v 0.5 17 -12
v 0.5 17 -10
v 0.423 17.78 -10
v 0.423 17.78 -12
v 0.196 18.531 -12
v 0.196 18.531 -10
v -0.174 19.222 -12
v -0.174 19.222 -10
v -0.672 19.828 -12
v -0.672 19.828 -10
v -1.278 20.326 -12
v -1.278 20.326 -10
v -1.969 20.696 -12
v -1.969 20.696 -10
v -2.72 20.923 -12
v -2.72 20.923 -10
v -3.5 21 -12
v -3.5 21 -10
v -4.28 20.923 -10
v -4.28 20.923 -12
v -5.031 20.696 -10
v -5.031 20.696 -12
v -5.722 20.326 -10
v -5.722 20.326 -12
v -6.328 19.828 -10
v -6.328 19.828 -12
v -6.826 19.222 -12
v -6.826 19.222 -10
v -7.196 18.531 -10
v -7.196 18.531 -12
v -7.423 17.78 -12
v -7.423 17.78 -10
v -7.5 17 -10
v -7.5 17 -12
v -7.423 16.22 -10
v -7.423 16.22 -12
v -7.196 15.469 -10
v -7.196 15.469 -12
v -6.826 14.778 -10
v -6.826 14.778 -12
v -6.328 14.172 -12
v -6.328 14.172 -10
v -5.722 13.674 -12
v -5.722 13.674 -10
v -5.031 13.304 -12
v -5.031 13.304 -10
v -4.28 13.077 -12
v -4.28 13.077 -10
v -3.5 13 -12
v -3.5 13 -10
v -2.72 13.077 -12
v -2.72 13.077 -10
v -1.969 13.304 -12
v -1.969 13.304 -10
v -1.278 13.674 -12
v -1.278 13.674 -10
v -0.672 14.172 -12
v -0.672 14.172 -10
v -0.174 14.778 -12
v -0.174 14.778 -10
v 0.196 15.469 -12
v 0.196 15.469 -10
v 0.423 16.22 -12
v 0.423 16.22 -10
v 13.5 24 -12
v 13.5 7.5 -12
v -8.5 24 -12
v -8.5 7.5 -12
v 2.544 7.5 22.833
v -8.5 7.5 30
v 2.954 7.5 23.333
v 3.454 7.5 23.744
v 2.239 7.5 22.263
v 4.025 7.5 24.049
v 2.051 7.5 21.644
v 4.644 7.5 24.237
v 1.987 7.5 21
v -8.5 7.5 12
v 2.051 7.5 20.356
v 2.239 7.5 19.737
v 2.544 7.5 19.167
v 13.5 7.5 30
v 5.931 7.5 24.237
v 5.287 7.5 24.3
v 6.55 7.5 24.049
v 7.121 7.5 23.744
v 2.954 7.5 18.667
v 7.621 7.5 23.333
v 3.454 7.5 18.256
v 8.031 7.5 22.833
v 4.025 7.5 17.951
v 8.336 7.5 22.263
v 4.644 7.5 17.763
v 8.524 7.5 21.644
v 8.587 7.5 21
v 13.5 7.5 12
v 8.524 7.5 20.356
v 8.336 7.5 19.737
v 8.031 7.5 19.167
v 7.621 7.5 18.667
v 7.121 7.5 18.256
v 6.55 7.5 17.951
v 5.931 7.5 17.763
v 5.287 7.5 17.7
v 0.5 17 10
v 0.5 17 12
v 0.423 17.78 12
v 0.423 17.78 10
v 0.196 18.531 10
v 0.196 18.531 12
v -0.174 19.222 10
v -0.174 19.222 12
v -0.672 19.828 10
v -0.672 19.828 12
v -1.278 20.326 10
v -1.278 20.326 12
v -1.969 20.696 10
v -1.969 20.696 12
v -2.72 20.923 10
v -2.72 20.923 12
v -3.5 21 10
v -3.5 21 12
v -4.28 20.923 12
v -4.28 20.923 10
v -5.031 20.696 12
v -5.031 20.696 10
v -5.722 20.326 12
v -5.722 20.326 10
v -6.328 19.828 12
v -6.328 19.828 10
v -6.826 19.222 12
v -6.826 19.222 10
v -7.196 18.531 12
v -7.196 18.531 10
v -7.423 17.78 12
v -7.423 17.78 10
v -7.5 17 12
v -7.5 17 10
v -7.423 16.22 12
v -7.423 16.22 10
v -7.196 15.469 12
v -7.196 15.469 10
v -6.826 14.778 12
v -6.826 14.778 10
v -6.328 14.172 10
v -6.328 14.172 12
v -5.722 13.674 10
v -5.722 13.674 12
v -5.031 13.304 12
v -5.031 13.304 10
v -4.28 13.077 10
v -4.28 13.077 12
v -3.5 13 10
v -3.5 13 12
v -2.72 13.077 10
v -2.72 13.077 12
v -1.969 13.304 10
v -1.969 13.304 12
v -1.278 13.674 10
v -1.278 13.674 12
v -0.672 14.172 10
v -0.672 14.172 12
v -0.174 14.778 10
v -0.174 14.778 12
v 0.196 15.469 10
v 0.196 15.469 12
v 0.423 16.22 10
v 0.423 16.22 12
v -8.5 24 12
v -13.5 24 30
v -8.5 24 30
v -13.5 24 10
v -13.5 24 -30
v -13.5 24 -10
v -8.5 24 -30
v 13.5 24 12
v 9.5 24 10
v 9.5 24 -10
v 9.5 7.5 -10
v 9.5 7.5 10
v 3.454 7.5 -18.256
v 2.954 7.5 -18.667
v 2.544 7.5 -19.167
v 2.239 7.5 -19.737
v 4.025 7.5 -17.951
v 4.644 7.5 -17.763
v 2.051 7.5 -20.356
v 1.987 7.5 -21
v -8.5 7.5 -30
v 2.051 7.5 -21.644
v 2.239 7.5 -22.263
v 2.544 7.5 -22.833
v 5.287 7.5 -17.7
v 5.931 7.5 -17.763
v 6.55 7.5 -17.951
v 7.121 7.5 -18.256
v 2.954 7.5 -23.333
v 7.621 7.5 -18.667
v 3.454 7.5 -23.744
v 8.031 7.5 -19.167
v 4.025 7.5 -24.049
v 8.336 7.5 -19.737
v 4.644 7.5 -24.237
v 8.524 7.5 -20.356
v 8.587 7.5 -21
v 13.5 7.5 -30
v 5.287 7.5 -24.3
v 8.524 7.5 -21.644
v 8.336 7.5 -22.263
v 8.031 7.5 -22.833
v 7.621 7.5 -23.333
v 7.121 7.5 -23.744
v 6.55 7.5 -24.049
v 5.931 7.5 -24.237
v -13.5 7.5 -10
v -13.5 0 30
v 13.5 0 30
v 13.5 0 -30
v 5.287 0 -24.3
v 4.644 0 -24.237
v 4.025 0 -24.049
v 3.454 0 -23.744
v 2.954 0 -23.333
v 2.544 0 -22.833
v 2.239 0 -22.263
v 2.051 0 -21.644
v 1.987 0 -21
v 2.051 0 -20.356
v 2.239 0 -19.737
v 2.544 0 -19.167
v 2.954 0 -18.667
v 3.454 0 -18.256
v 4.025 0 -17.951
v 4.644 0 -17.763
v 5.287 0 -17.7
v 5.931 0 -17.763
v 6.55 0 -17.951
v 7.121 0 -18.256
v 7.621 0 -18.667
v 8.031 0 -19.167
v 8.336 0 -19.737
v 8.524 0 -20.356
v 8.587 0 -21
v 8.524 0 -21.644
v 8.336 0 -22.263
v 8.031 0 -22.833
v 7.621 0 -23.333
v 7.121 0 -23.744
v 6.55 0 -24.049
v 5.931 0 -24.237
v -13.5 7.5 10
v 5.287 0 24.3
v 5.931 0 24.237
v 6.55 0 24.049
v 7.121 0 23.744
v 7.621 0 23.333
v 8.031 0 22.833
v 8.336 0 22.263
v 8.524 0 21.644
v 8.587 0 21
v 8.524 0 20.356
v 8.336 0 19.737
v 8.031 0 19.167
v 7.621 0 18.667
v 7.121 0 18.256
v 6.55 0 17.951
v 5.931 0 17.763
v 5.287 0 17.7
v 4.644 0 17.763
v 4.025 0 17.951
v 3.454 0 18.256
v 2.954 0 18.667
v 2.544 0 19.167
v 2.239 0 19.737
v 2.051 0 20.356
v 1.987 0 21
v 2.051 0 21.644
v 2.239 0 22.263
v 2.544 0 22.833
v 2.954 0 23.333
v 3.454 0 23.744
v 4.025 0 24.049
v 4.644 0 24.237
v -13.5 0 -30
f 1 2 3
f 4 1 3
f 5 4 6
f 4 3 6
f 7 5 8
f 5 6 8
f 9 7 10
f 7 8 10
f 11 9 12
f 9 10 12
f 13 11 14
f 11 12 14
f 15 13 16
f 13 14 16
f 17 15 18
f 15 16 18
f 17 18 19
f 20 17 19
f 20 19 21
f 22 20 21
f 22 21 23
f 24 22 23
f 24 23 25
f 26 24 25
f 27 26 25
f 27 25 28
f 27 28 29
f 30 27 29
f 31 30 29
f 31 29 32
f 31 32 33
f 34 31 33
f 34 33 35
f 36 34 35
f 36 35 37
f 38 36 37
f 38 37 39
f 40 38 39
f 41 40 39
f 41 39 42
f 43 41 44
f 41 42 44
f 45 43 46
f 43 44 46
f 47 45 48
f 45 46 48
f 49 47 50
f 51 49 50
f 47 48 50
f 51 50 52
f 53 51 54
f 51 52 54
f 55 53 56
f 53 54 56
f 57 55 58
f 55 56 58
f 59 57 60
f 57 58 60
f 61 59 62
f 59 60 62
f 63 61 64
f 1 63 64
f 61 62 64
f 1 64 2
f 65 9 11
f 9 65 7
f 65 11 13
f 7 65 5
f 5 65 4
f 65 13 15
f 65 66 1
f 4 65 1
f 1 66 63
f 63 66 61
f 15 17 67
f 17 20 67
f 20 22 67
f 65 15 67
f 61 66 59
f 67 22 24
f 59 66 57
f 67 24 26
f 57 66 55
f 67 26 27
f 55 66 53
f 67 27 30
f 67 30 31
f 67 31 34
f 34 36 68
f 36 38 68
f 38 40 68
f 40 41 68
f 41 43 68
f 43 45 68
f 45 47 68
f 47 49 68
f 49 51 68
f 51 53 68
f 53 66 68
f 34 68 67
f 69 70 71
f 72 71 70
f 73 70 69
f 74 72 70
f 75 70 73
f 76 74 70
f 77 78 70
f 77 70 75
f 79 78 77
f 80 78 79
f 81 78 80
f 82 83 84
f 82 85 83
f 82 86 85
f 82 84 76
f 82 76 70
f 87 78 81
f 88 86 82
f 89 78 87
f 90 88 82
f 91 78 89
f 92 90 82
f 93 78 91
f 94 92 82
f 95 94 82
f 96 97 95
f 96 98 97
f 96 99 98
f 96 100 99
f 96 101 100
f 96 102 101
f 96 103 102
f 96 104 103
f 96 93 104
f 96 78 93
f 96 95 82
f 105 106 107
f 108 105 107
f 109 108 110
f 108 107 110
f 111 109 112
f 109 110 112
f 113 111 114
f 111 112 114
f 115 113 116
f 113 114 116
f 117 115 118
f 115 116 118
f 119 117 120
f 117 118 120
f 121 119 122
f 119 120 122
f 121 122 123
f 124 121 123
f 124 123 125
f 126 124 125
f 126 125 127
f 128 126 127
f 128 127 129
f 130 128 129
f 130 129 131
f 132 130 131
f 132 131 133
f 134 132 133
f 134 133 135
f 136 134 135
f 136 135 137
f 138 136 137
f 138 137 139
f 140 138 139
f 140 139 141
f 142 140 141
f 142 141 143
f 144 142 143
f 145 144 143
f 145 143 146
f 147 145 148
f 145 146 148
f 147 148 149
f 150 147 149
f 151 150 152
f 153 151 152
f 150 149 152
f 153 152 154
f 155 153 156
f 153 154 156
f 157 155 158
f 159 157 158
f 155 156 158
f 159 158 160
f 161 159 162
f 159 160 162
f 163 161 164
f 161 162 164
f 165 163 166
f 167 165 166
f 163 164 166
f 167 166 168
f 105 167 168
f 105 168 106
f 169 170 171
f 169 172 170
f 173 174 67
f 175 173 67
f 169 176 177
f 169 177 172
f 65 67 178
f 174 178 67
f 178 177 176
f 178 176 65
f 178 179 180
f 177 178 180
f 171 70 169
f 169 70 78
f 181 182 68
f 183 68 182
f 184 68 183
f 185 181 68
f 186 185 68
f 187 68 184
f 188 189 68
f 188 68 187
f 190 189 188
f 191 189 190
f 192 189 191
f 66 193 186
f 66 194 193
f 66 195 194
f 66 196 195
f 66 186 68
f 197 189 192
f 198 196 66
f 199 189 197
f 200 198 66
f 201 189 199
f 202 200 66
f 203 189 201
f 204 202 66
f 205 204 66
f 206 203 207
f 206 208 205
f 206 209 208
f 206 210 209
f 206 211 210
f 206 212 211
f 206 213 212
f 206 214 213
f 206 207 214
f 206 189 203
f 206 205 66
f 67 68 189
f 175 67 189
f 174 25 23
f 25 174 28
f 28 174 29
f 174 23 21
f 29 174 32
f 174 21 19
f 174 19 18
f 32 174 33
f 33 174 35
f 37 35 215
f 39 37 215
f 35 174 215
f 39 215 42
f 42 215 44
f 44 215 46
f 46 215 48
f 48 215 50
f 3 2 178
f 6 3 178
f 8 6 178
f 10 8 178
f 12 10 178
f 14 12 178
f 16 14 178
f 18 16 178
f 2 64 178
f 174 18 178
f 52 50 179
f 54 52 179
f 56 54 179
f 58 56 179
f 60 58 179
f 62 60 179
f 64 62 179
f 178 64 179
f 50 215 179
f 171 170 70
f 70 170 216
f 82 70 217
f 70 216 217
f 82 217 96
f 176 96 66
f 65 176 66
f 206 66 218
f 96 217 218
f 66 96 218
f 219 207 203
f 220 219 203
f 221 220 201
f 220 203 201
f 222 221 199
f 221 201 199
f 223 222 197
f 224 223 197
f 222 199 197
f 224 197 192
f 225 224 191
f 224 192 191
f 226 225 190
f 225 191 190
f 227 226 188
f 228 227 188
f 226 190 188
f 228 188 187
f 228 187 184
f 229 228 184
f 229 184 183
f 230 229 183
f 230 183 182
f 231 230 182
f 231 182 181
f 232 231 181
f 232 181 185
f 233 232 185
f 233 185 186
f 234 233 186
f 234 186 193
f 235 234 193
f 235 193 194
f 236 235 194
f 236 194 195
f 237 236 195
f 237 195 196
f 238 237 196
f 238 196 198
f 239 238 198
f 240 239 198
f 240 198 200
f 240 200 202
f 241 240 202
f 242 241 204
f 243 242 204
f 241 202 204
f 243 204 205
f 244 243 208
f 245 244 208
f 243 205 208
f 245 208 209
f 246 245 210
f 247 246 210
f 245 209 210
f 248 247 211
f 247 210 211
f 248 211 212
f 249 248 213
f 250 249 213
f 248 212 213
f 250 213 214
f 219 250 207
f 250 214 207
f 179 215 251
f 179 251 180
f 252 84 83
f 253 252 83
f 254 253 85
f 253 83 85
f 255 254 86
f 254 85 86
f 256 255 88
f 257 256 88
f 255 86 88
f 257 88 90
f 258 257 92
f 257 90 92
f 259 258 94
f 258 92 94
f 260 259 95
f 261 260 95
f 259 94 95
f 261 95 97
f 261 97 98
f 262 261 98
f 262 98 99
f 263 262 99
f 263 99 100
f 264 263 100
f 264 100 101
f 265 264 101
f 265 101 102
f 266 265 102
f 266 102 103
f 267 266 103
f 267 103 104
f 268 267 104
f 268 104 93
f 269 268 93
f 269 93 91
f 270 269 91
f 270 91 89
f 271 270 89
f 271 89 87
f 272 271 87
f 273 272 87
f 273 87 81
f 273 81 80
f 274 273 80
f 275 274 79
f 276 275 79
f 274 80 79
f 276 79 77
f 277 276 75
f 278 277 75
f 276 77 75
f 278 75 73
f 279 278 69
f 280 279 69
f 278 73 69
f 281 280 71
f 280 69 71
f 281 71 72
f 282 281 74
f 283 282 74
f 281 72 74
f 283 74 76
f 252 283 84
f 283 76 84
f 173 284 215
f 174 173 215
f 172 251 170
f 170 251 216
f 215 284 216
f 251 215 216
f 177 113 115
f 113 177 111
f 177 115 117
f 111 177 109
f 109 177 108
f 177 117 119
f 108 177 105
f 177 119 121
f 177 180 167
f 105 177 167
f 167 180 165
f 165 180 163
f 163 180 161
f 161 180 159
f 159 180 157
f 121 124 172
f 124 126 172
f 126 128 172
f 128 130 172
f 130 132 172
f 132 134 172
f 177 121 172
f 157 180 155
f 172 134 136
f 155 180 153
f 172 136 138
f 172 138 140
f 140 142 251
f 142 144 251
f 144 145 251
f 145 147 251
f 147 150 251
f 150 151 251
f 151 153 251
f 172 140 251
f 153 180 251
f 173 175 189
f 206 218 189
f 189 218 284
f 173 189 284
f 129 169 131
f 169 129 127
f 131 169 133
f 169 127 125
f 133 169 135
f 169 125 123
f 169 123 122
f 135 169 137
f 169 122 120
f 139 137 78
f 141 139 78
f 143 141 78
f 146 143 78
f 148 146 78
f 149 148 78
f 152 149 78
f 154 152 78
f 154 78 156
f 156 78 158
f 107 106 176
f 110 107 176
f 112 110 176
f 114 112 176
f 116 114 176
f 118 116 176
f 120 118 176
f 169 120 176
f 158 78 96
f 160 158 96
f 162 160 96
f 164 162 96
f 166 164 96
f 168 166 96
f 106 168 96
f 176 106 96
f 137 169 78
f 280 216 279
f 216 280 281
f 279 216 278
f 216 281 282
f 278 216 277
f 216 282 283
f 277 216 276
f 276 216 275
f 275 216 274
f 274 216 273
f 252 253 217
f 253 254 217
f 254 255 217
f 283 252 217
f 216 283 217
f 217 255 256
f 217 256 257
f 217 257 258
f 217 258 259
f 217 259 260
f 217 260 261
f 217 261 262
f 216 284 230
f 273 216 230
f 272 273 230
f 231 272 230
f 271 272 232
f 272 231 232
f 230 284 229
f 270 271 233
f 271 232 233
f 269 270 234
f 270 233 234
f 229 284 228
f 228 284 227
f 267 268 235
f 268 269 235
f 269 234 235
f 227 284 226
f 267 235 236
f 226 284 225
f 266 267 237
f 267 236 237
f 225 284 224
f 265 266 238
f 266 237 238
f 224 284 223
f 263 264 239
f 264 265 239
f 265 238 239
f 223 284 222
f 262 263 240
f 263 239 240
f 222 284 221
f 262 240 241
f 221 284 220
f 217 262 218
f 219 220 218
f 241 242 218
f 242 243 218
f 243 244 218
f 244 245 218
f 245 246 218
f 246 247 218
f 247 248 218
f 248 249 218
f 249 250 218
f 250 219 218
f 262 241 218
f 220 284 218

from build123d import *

# Parameters (mm, degrees)
SKETCH2_W           = 27
SKETCH2_H           = 60
BOSS_EXTRUDE1_DEPTH = 7.5
BOSS_EXTRUDE2_DEPTH = 16.5
SKETCH4_R           = 4
CUT_EXTRUDE1_DEPTH  = 51.222007128
SKETCH5_R           = 3.3
CUT_EXTRUDE2_DEPTH  = 37.803532439


with BuildPart() as part:
    # Sketch2 → Boss-Extrude1 (new body)
    with BuildSketch(Plane(origin=(0, 0, 0), x_dir=(1, 0, 0), z_dir=(0, 1, 0))):
        Rectangle(SKETCH2_W, SKETCH2_H)
    extrude(amount=BOSS_EXTRUDE1_DEPTH)

    # Sketch3 → Boss-Extrude2 (add)
    with BuildSketch(Plane(origin=(0, 7.5, 0), x_dir=(1, 0, 0), z_dir=(0, 1, 0))):
        Polygon((-13.5, -30), (-8.5, -30), (-8.5, -12), (13.5, -12), (13.5, 12), (-8.5, 12), (-8.5, 30), (-13.5, 30), (-13.5, 10), (9.5, 10), (9.5, -10), (-13.5, -10), align=None)
    extrude(amount=BOSS_EXTRUDE2_DEPTH)

    # Sketch4 → Cut-Extrude1 (cut, through all)
    with BuildSketch(Plane.XY.offset(12)):
        with Locations((-3.5, 17)):
            Circle(SKETCH4_R)
    extrude(amount=-CUT_EXTRUDE1_DEPTH, mode=Mode.SUBTRACT)

    # Sketch5 → Cut-Extrude2 (cut, through all)
    with BuildSketch(Plane(origin=(0, 7.5, 0), x_dir=(1, 0, 0), z_dir=(0, 1, 0))):
        with Locations(Location((5.287468246, -21, 0), (0, 0, 270))):
            Circle(SKETCH5_R)
        with Locations(Location((5.287468246, 21, 0), (0, 0, 90))):
            Circle(SKETCH5_R)
    extrude(amount=-CUT_EXTRUDE2_DEPTH, mode=Mode.SUBTRACT)


solid = part.part
